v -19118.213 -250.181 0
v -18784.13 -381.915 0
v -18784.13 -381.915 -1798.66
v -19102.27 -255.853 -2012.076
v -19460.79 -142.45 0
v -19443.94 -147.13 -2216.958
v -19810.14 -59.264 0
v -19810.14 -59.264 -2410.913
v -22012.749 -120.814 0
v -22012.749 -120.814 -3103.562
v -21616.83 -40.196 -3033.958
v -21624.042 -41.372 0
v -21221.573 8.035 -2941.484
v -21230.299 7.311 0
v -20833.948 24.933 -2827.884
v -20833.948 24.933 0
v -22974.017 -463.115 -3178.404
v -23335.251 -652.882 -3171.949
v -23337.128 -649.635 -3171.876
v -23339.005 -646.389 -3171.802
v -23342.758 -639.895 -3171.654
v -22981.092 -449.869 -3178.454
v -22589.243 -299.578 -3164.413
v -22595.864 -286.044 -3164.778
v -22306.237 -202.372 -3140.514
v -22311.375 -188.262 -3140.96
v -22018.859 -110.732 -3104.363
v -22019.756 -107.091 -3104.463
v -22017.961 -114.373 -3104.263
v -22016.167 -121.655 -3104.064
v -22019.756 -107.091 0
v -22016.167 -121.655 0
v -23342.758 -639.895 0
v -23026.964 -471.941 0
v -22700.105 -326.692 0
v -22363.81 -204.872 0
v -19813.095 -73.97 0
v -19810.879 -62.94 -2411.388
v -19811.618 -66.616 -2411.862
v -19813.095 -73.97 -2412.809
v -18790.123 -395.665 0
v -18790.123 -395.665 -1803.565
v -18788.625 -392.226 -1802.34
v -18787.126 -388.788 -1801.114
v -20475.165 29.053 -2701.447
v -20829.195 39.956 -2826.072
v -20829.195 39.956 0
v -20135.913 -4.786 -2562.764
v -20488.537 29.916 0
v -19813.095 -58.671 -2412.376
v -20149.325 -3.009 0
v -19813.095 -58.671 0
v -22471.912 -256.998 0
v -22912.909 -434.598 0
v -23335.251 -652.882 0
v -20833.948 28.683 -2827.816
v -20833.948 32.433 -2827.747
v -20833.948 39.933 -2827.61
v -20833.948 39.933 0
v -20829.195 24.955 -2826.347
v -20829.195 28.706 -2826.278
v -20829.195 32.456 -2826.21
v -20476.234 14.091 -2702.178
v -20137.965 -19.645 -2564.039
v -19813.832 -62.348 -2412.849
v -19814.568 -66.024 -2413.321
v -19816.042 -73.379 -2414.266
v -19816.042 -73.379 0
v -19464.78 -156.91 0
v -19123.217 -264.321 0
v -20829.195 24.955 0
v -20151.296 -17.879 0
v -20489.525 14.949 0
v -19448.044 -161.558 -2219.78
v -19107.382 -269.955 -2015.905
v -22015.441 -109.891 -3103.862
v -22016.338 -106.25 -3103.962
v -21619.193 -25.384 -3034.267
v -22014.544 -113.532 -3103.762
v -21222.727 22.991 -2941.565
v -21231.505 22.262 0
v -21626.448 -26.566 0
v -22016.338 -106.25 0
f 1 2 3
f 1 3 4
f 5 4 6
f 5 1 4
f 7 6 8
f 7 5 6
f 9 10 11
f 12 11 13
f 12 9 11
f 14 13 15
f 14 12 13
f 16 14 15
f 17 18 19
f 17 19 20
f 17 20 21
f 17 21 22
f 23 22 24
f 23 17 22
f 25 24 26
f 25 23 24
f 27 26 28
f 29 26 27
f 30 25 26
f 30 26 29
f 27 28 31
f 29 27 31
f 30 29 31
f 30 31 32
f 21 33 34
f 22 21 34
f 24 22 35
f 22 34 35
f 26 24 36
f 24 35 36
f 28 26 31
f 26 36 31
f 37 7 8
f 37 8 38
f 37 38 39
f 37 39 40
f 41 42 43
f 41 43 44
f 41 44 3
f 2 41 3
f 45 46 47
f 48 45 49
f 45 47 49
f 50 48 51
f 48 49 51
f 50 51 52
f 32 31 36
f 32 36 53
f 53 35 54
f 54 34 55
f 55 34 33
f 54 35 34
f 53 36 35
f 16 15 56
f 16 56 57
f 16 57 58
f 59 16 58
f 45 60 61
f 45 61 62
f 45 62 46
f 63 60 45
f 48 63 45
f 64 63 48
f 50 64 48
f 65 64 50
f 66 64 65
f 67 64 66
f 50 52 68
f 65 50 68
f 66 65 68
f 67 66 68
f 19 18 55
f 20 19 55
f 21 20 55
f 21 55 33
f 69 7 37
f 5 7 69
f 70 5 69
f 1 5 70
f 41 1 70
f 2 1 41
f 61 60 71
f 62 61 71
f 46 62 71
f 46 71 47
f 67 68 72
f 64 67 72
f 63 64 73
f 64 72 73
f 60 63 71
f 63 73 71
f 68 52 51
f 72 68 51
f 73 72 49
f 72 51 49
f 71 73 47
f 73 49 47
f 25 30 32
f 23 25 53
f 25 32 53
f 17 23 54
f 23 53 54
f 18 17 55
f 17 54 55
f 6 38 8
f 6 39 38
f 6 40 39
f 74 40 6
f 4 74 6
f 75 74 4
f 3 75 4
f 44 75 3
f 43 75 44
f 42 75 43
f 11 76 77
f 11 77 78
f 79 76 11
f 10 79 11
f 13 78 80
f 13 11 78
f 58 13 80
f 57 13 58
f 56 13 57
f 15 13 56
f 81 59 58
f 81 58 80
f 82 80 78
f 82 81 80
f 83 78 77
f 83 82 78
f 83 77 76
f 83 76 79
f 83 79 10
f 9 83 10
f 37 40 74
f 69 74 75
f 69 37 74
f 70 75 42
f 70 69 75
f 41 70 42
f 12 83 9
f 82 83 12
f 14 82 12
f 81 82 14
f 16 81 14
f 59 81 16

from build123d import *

# Parameters (mm, degrees)
BOSS_EXTRUDE1_DEPTH   = 3583.694422
BOSS_EXTRUDE1_2_DEPTH = 3583.694422
BOSS_EXTRUDE1_3_DEPTH = 3583.694422
BOSS_EXTRUDE1_4_DEPTH = 3583.694422
CUT_EXTRUDE1_DEPTH    = 10093.227131579


with BuildPart() as part:
    # Sketch1 → Boss-Extrude1 (new body)
    with BuildSketch(Plane.XY):
        with BuildLine():
            Line((-23335.251402241, -652.881922545), (-23342.758138859, -639.895433206))
            ThreePointArc((-23342.758138859, -639.895433206), (-22700.104960378, -326.691684273), (-22019.755739598, -107.090605176))
            Line((-22019.755739598, -107.090605176), (-22016.167075238, -121.654996276))
            ThreePointArc((-22016.167075238, -121.654996276), (-22694.501441466, -340.605726669), (-23335.251402241, -652.881922545))
        make_face()
    extrude(amount=-BOSS_EXTRUDE1_DEPTH)


with BuildPart() as body_2:
    # Sketch1 → Boss-Extrude1 2 (new body)
    with BuildSketch(Plane.XY):
        with BuildLine():
            Line((-18790.123490112, -395.665128297), (-18784.129846793, -381.914628678))
            ThreePointArc((-18784.129846793, -381.914628678), (-19288.54647688, -193.278110813), (-19810.140273885, -59.263994))
            Line((-19810.140273885, -59.263994), (-19813.095386818, -73.970023633))
            ThreePointArc((-19813.095386818, -73.970023633), (-19293.0462901, -207.587257573), (-18790.123490112, -395.665128297))
        make_face()
    extrude(amount=-BOSS_EXTRUDE1_2_DEPTH)


with BuildPart() as body_3:
    # Sketch1 → Boss-Extrude1 3 (new body)
    with BuildSketch(Plane.XY):
        with BuildLine():
            Line((-20829.194612545, 24.955453799), (-20829.194612545, 39.955585724))
            ThreePointArc((-20829.194612545, 39.955585724), (-20318.653824606, 16.307524828), (-19813.095386818, -58.671091552))
            Line((-19813.095386818, -58.671091552), (-19816.041748182, -73.378877065))
            ThreePointArc((-19816.041748182, -73.378877065), (-20320.13423627, 1.380724409), (-20829.194612545, 24.955453799))
        make_face()
    extrude(amount=-BOSS_EXTRUDE1_3_DEPTH)


with BuildPart() as body_4:
    # Sketch1 → Boss-Extrude1 4 (new body)
    with BuildSketch(Plane.XY):
        with BuildLine():
            Line((-20833.948404266, 24.933249016), (-20833.948404266, 39.933446702))
            ThreePointArc((-20833.948404266, 39.933446702), (-21429.456343968, 1.728199316), (-22016.338028454, -106.249740986))
            Line((-22016.338028454, -106.249740986), (-22012.749363226, -120.814135613))
            ThreePointArc((-22012.749363226, -120.814135613), (-21427.648836894, -13.162536936), (-20833.948404266, 24.933249016))
        make_face()
    extrude(amount=-BOSS_EXTRUDE1_4_DEPTH)


with BuildPart() as cut_extrude1_tool:
    # Sketch2 → Cut-Extrude1 (new body, through all)
    with BuildSketch(Plane(origin=(-13215.769587775, -9495.416647579, 12327.336037209), x_dir=(-0.998403381, -0.056486181, 0), z_dir=(-0.056486181, 0.998403381, 0))):
        with BuildLine():
            Line((4915.975271348, -14030.30481095), (4915.975271348, -16551.962367755))
            Line((4915.975271348, -16551.962367755), (9934.445108247, -16551.962367755))
            Line((9934.445108247, -16551.962367755), (9934.445108247, -15483.330555695))
            Line((9934.445108247, -15483.330555695), (9864.461322562, -15483.330555695))
            ThreePointArc((9864.461322562, -15483.330555695), (7256.210118512, -15213.201614697), (4915.975271348, -14030.30481095))
        make_face()
    extrude(amount=CUT_EXTRUDE1_DEPTH)


with BuildPart() as part_1:
    add(part.part)

    # Cut-Extrude1: cut by cut_extrude1_tool
    add(cut_extrude1_tool.part, mode=Mode.SUBTRACT)


with BuildPart() as body_2_1:
    add(body_2.part)

    # Cut-Extrude1: cut by cut_extrude1_tool
    add(cut_extrude1_tool.part, mode=Mode.SUBTRACT)


with BuildPart() as body_3_1:
    add(body_3.part)

    # Cut-Extrude1: cut by cut_extrude1_tool
    add(cut_extrude1_tool.part, mode=Mode.SUBTRACT)


with BuildPart() as body_4_1:
    add(body_4.part)

    # Cut-Extrude1: cut by cut_extrude1_tool
    add(cut_extrude1_tool.part, mode=Mode.SUBTRACT)


solid = Compound([part_1.part, body_2_1.part, body_3_1.part, body_4_1.part])
